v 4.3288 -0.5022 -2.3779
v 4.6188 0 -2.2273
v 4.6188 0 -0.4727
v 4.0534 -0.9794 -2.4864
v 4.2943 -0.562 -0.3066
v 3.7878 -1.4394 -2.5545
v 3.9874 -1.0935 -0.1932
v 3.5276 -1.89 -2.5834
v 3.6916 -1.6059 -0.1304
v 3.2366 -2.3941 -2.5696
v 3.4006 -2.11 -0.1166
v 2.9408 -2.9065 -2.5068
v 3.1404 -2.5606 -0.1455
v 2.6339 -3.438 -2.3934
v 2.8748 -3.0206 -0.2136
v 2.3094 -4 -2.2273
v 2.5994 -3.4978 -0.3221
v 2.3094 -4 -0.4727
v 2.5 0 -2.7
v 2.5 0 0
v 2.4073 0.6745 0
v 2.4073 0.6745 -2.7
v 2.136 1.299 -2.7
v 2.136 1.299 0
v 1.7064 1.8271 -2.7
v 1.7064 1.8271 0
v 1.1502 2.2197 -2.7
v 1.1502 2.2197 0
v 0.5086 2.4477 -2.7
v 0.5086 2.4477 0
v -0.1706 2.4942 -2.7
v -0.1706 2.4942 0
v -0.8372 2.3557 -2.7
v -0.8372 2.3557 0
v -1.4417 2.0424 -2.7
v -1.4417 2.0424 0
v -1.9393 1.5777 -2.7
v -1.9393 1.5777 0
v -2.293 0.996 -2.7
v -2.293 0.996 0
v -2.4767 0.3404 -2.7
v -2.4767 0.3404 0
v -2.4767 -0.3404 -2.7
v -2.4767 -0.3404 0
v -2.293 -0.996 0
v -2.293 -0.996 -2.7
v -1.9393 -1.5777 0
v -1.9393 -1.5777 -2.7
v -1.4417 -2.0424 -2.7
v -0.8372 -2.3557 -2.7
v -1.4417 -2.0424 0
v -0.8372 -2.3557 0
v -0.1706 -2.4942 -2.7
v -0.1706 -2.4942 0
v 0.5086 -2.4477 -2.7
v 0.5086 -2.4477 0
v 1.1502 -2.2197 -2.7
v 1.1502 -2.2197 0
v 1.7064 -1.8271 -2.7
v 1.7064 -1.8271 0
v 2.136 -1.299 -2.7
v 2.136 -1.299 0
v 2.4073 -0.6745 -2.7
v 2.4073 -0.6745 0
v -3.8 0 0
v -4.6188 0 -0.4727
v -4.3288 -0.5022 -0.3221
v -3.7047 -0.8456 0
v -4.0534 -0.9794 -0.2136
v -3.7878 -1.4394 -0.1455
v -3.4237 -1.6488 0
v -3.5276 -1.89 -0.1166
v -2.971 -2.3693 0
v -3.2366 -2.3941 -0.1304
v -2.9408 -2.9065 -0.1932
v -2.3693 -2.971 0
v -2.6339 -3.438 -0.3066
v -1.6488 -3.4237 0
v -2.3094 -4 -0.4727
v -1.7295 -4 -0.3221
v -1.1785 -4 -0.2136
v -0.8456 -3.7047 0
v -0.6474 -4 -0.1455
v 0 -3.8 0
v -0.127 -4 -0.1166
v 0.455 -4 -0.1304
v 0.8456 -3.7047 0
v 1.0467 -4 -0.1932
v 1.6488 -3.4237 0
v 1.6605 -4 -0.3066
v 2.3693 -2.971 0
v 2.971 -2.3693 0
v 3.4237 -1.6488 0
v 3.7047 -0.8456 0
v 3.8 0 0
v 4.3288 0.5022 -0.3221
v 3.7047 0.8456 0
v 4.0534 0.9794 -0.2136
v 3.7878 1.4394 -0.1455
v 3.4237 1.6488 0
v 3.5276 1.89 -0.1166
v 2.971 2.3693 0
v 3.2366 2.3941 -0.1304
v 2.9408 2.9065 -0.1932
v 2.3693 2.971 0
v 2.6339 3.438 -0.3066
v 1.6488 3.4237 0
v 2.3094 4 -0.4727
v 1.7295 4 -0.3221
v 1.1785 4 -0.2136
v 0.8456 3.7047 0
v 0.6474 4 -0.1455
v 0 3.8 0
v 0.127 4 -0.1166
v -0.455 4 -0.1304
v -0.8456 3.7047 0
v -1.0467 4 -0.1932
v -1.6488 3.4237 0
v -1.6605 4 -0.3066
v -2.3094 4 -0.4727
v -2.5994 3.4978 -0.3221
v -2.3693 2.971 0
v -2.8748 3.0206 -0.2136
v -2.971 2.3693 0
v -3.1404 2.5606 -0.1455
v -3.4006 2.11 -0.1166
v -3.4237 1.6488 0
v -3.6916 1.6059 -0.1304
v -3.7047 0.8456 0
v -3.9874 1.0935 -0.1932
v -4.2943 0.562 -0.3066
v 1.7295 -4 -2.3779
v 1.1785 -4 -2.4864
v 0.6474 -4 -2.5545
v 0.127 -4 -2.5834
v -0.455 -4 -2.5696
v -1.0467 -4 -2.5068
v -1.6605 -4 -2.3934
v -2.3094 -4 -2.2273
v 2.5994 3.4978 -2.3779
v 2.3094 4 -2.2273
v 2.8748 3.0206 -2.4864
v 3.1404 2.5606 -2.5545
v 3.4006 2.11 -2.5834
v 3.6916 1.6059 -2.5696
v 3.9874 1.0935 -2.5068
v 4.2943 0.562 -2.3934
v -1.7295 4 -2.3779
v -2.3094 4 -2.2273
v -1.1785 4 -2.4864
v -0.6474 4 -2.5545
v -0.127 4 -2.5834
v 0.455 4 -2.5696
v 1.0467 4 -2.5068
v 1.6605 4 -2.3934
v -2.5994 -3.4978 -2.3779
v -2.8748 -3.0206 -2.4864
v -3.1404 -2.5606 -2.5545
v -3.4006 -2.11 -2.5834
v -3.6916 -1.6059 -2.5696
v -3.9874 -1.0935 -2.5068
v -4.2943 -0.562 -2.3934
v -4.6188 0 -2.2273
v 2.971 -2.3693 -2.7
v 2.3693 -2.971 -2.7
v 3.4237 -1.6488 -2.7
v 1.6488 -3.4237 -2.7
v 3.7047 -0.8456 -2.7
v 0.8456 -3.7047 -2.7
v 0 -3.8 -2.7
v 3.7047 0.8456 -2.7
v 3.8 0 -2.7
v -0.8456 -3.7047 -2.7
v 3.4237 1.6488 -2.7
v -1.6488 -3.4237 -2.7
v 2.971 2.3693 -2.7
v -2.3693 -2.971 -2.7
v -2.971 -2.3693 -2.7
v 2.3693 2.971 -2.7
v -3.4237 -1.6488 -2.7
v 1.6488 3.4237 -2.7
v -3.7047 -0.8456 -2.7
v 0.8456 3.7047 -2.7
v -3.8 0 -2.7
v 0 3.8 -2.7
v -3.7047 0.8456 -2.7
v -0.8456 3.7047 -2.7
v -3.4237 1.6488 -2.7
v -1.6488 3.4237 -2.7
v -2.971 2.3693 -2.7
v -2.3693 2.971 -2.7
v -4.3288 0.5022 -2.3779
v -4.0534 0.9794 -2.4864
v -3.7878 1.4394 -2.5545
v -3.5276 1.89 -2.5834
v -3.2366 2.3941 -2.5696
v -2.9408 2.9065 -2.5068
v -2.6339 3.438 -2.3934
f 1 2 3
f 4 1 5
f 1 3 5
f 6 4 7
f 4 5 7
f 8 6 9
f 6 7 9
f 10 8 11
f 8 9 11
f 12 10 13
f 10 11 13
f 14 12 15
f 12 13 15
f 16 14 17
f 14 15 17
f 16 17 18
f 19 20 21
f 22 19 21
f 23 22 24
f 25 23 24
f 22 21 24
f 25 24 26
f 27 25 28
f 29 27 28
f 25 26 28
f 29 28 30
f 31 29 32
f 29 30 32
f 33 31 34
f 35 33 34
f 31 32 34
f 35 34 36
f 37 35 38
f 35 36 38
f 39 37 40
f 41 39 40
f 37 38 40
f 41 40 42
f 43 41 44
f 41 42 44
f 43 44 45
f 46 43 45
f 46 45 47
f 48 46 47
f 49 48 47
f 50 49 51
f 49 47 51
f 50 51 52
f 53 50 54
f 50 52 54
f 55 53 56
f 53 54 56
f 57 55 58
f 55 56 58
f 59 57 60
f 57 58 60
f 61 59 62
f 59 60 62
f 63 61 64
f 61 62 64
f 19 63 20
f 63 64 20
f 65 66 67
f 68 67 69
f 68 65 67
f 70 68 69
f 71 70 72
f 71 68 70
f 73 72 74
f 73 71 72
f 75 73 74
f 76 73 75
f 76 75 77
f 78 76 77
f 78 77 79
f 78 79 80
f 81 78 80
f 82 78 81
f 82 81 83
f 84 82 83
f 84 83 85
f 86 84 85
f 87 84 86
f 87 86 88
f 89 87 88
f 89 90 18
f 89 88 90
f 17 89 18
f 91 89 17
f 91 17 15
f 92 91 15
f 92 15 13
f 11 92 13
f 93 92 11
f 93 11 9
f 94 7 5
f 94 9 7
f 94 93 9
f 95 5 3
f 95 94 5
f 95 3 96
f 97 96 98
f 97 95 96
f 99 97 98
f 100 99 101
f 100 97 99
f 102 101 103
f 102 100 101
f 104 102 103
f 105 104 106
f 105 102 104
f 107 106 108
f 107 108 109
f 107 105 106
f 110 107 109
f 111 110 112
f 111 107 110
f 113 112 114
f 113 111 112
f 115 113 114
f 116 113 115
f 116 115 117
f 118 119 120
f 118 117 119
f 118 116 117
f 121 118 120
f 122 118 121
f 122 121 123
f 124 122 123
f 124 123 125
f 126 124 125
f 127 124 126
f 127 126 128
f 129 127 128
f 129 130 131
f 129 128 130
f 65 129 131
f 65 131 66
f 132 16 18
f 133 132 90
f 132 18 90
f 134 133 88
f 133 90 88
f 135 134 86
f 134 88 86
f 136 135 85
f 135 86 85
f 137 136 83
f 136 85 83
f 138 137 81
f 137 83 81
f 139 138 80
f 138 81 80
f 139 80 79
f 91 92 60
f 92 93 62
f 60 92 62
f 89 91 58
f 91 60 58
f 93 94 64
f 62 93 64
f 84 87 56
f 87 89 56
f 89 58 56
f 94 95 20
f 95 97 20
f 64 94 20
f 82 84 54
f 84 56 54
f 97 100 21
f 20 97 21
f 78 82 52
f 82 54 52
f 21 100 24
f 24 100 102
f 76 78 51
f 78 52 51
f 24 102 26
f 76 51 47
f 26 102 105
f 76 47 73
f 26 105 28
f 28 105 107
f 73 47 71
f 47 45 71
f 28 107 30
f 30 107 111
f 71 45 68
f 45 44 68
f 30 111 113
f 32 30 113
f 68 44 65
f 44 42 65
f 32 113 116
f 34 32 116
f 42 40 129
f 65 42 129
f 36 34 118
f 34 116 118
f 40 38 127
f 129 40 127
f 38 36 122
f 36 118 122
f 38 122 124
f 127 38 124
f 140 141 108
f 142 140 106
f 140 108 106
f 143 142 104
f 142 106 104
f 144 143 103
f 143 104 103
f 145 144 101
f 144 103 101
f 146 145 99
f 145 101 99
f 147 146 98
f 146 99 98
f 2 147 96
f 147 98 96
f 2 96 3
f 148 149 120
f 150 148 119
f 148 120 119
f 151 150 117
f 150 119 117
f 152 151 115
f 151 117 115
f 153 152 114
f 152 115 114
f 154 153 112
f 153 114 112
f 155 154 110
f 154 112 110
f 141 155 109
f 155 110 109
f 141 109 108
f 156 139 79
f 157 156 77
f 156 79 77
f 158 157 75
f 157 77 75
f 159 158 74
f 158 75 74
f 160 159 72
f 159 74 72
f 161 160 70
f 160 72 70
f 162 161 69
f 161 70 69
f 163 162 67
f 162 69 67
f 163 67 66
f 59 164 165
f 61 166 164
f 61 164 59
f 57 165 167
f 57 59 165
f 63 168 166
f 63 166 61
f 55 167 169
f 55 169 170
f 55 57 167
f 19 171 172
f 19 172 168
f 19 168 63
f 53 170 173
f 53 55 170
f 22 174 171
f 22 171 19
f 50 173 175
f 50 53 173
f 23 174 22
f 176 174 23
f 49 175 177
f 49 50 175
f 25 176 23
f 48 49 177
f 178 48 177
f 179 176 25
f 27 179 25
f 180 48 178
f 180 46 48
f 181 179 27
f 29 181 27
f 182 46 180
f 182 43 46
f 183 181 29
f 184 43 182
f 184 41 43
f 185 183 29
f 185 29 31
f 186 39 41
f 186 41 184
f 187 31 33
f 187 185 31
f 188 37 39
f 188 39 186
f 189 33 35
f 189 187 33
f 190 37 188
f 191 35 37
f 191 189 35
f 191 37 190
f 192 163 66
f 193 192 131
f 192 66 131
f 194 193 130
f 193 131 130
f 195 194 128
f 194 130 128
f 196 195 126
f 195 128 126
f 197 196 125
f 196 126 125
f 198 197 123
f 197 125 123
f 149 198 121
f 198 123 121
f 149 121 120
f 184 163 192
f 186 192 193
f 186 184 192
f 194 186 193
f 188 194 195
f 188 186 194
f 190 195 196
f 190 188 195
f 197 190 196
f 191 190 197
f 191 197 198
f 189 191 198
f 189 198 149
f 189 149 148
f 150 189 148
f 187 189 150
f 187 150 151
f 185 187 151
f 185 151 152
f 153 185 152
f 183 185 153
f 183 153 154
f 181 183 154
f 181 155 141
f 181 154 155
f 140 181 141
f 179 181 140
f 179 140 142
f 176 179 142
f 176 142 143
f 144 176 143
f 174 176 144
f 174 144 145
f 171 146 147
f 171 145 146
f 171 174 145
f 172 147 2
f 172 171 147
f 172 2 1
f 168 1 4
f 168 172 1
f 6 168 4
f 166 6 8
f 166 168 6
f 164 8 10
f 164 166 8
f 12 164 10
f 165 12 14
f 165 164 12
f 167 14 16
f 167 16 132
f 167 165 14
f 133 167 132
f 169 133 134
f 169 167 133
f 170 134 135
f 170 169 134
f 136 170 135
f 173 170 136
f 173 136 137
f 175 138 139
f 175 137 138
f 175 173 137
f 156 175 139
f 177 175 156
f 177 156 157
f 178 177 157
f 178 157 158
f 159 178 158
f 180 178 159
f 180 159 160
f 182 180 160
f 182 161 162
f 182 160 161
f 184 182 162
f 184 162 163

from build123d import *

# Parameters (mm, degrees)
BASENUTSKE_R            = 2.5
BASENUT_DEPTH           = 2.7
SKETCH6_OUTSIDE_W       = 40.346
SKETCH6_OUTSIDE_H       = 39.108
SKETCH6_OUTSIDE_R       = 3.8
CUT_EXTRUDE2_DEPTH      = 7.68006986
CUT_EXTRUDE2_DRAFT      = -60
MIRROR1_COPY_1_SKETCH_W = 40.346
MIRROR1_COPY_1_SKETCH_H = 39.108
MIRROR1_COPY_1_SKETCH_R = 3.8
MIRROR1_COPY_1_DEPTH    = 7.68006986
MIRROR1_COPY_1_DRAFT    = -60


with BuildPart() as part:
    # BaseNutSke → BaseNut (new body)
    with BuildSketch(Plane.XY):
        Polygon((2.309401077, -4), (-2.309401077, -4), (-4.618802154, 0), (-2.309401077, 4), (2.309401077, 4), (4.618802154, 0), align=None)
        Circle(BASENUTSKE_R, mode=Mode.SUBTRACT)
    extrude(amount=-BASENUT_DEPTH)


with BuildPart() as cut_extrude2_tool:
    # Sketch6 outside → Cut-Extrude2 (with draft: the straight prism first)
    with BuildSketch(Plane(origin=(0, 0, -2.7), x_dir=(-1, 0, 0), z_dir=(0, 0, -1))):
        Rectangle(SKETCH6_OUTSIDE_W, SKETCH6_OUTSIDE_H)
        Circle(SKETCH6_OUTSIDE_R, mode=Mode.SUBTRACT)
    extrude(amount=-CUT_EXTRUDE2_DEPTH)
    # Cut-Extrude2: the draft: its side faces are tilted about the plane it starts from
    cut_extrude2_sides = [cut_extrude2_tool.faces().sort_by_distance(p)[0] for p in [
        (0, -19.554, 1.14003493),
        (-20.173, 0, 1.14003493),
        (0, 19.554, 1.14003493),
        (20.173, 0, 1.14003493),
        (3.8, 0, 1.14003493),
    ]]
    draft(cut_extrude2_sides, Plane(origin=(0, 0, -2.7), x_dir=(-1, 0, 0), z_dir=(0, 0, -1)), CUT_EXTRUDE2_DRAFT)


with BuildPart() as part_1:
    add(part.part)

    # Cut-Extrude2: cut by cut_extrude2_tool
    add(cut_extrude2_tool.part, mode=Mode.SUBTRACT)


with BuildPart() as mirror1_copy_1_tool:
    # Mirror1 copy 1 sketch → Mirror1 copy 1 (with draft: the straight prism first)
    with BuildSketch(Plane(origin=(0, 0, 0), x_dir=(-1, 0, 0), z_dir=(0, 0, 1))):
        Rectangle(MIRROR1_COPY_1_SKETCH_W, MIRROR1_COPY_1_SKETCH_H)
        Circle(MIRROR1_COPY_1_SKETCH_R, mode=Mode.SUBTRACT)
    extrude(amount=-MIRROR1_COPY_1_DEPTH)
    # Mirror1 copy 1: the draft: its side faces are tilted about the plane it starts from
    mirror1_copy_1_sides = [mirror1_copy_1_tool.faces().sort_by_distance(p)[0] for p in [
        (0, -19.554, -3.84003493),
        (-20.173, 0, -3.84003493),
        (0, 19.554, -3.84003493),
        (20.173, 0, -3.84003493),
        (3.8, 0, -3.84003493),
    ]]
    draft(mirror1_copy_1_sides, Plane(origin=(0, 0, 0), x_dir=(-1, 0, 0), z_dir=(0, 0, 1)), MIRROR1_COPY_1_DRAFT)


with BuildPart() as part_2:
    add(part_1.part)

    # Mirror1 copy 1: cut by mirror1_copy_1_tool
    add(mirror1_copy_1_tool.part, mode=Mode.SUBTRACT)


solid = part_2.part
